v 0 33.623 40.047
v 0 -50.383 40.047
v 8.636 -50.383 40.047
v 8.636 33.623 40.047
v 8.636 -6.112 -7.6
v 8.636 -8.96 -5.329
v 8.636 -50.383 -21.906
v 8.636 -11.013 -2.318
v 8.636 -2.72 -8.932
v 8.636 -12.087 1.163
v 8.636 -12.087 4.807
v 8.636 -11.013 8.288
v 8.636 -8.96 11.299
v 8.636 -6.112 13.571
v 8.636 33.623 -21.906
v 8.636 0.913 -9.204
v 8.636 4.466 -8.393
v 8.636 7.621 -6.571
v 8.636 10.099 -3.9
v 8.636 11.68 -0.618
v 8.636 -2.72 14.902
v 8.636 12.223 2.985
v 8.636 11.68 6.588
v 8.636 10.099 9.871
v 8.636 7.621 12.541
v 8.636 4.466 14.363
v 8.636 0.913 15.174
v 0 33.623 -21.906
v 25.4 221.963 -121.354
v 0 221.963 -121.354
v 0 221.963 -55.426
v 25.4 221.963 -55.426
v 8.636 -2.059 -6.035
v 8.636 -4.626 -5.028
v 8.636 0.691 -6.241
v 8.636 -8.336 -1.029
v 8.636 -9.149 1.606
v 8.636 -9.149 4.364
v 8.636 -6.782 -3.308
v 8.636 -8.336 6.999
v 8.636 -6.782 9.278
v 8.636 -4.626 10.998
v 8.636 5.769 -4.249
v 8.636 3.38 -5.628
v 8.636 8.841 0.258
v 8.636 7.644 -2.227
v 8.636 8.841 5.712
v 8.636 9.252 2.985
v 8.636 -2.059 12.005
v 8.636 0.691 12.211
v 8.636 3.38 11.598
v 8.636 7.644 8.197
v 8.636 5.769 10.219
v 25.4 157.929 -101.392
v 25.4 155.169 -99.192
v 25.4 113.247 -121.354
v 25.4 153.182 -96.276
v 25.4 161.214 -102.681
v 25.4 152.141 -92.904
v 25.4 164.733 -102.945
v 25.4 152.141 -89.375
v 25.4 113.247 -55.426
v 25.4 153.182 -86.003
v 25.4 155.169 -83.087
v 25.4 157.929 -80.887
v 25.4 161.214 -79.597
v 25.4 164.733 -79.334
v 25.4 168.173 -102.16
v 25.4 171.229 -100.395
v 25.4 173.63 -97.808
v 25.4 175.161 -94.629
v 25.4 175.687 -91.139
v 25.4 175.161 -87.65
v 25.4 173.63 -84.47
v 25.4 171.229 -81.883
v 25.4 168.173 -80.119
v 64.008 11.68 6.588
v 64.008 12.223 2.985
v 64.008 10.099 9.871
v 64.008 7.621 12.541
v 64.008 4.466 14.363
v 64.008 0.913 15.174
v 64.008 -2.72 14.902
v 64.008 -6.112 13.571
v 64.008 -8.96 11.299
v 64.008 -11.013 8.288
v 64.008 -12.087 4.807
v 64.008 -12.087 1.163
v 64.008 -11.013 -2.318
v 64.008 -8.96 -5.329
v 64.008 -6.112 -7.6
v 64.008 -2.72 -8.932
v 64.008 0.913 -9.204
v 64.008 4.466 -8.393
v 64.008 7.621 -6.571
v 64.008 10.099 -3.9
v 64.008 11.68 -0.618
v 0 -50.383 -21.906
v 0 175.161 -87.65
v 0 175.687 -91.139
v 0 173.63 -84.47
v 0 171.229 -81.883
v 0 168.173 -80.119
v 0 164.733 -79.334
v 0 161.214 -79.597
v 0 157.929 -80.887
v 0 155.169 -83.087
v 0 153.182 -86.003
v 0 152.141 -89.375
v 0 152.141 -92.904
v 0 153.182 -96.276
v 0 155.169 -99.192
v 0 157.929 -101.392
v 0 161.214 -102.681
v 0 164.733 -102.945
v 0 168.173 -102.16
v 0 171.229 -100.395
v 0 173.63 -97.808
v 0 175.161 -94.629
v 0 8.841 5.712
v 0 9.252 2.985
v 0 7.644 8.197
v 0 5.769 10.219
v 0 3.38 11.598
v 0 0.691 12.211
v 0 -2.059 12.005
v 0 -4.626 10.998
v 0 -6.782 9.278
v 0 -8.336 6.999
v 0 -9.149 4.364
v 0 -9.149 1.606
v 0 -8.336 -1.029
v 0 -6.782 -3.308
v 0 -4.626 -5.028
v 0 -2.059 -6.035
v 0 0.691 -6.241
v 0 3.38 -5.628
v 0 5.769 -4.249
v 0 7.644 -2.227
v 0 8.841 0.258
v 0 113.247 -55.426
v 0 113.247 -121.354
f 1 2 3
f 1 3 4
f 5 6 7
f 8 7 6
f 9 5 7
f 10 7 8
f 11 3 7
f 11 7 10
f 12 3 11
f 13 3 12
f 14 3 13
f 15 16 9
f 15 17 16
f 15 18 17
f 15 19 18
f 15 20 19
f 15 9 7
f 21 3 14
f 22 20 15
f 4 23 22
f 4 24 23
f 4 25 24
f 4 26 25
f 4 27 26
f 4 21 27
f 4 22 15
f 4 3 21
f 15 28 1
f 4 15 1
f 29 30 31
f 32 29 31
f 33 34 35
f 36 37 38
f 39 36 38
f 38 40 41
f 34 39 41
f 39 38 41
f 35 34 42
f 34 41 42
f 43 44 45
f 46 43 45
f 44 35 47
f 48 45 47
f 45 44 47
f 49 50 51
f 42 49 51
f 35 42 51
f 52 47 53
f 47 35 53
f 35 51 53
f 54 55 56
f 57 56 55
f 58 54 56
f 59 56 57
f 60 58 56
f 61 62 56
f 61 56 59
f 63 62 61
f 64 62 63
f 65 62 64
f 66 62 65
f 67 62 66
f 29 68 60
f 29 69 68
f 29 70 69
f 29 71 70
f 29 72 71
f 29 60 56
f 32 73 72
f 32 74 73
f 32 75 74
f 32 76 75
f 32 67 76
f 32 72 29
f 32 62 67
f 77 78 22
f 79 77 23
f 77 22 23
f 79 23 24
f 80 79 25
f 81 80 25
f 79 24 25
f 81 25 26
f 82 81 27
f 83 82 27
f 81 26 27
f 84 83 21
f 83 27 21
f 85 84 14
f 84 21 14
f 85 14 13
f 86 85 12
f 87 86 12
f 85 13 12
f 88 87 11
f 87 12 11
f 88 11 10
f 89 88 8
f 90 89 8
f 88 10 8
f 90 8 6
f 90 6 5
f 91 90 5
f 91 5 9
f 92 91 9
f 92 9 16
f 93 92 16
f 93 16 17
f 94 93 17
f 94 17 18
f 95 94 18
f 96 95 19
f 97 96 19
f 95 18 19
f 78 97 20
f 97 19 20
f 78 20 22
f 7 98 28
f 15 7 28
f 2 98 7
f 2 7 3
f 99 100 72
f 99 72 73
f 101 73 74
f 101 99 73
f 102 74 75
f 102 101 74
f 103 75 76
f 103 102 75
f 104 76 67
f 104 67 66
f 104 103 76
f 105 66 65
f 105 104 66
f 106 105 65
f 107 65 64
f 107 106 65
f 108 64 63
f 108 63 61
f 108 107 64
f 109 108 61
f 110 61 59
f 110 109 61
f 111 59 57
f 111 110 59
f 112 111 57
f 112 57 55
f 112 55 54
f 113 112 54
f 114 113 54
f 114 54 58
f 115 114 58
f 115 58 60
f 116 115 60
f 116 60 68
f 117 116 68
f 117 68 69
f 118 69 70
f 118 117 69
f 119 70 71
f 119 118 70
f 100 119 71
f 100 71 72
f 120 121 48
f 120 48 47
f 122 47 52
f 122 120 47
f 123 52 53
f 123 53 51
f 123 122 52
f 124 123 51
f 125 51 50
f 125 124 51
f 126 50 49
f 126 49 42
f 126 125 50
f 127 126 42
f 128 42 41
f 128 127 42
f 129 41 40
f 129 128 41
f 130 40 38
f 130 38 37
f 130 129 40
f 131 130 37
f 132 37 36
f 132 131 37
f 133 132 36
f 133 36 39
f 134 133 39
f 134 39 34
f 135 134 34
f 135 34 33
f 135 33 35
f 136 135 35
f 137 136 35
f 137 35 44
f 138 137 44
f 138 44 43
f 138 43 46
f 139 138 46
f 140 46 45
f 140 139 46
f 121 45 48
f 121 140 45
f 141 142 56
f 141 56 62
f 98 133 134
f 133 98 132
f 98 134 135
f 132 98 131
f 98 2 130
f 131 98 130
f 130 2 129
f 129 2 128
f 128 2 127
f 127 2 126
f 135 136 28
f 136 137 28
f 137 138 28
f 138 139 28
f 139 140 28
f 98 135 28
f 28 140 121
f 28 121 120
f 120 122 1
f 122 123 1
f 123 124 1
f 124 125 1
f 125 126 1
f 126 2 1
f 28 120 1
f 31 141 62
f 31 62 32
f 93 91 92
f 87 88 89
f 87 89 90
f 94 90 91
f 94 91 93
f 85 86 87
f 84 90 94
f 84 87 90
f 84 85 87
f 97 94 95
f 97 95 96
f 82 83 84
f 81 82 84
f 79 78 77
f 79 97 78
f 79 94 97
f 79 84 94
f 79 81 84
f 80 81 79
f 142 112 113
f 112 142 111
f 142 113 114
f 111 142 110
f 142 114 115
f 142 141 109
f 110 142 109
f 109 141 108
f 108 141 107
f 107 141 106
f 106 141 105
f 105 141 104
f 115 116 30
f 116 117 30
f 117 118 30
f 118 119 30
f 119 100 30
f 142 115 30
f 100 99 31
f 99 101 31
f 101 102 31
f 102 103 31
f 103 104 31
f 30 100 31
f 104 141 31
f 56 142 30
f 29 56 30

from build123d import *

# Parameters (mm, degrees)
F3_W     = 84.005985409
F3_H     = 61.9537178427
F3_R     = 9.2521212974
F4_DEPTH = 8.636
F5_R     = 12.2230702702
F6_DEPTH = 55.372
F7_W     = 108.715981245
F7_H     = 65.9279860556
F7_R     = 11.8387821777
F8_DEPTH = 25.4


# Not quite as in the source:
# - the program builds the solid bodies; features that only make, move or delete a surface that nothing else refers to are left out


with BuildPart() as f4:
    # F3 (on face) → F4 (new body)
    with BuildSketch(Plane.YZ):
        with Locations((-8.3795879036, 9.0704439208)):
            Rectangle(F3_W, F3_H)
        with Locations((0, 2.9850138817)):
            Circle(F3_R, mode=Mode.SUBTRACT)
    extrude(amount=F4_DEPTH)

    # F5 (on face) → F6 (join)
    with BuildSketch(Plane.YZ.offset(8.636)):
        with Locations((0, 2.9850138817)):
            Circle(F5_R)
    extrude(amount=F6_DEPTH)


with BuildPart() as f8:
    # F7 (on Right) → F8 (new body)
    with BuildSketch(Plane.YZ):
        with Locations((167.6053851843, -88.389961049)):
            Rectangle(F7_W, F7_H)
        with Locations((163.8479083776, -91.1392197013)):
            Circle(F7_R, mode=Mode.SUBTRACT)
    extrude(amount=F8_DEPTH)


solid = Compound([f4.part, f8.part])
